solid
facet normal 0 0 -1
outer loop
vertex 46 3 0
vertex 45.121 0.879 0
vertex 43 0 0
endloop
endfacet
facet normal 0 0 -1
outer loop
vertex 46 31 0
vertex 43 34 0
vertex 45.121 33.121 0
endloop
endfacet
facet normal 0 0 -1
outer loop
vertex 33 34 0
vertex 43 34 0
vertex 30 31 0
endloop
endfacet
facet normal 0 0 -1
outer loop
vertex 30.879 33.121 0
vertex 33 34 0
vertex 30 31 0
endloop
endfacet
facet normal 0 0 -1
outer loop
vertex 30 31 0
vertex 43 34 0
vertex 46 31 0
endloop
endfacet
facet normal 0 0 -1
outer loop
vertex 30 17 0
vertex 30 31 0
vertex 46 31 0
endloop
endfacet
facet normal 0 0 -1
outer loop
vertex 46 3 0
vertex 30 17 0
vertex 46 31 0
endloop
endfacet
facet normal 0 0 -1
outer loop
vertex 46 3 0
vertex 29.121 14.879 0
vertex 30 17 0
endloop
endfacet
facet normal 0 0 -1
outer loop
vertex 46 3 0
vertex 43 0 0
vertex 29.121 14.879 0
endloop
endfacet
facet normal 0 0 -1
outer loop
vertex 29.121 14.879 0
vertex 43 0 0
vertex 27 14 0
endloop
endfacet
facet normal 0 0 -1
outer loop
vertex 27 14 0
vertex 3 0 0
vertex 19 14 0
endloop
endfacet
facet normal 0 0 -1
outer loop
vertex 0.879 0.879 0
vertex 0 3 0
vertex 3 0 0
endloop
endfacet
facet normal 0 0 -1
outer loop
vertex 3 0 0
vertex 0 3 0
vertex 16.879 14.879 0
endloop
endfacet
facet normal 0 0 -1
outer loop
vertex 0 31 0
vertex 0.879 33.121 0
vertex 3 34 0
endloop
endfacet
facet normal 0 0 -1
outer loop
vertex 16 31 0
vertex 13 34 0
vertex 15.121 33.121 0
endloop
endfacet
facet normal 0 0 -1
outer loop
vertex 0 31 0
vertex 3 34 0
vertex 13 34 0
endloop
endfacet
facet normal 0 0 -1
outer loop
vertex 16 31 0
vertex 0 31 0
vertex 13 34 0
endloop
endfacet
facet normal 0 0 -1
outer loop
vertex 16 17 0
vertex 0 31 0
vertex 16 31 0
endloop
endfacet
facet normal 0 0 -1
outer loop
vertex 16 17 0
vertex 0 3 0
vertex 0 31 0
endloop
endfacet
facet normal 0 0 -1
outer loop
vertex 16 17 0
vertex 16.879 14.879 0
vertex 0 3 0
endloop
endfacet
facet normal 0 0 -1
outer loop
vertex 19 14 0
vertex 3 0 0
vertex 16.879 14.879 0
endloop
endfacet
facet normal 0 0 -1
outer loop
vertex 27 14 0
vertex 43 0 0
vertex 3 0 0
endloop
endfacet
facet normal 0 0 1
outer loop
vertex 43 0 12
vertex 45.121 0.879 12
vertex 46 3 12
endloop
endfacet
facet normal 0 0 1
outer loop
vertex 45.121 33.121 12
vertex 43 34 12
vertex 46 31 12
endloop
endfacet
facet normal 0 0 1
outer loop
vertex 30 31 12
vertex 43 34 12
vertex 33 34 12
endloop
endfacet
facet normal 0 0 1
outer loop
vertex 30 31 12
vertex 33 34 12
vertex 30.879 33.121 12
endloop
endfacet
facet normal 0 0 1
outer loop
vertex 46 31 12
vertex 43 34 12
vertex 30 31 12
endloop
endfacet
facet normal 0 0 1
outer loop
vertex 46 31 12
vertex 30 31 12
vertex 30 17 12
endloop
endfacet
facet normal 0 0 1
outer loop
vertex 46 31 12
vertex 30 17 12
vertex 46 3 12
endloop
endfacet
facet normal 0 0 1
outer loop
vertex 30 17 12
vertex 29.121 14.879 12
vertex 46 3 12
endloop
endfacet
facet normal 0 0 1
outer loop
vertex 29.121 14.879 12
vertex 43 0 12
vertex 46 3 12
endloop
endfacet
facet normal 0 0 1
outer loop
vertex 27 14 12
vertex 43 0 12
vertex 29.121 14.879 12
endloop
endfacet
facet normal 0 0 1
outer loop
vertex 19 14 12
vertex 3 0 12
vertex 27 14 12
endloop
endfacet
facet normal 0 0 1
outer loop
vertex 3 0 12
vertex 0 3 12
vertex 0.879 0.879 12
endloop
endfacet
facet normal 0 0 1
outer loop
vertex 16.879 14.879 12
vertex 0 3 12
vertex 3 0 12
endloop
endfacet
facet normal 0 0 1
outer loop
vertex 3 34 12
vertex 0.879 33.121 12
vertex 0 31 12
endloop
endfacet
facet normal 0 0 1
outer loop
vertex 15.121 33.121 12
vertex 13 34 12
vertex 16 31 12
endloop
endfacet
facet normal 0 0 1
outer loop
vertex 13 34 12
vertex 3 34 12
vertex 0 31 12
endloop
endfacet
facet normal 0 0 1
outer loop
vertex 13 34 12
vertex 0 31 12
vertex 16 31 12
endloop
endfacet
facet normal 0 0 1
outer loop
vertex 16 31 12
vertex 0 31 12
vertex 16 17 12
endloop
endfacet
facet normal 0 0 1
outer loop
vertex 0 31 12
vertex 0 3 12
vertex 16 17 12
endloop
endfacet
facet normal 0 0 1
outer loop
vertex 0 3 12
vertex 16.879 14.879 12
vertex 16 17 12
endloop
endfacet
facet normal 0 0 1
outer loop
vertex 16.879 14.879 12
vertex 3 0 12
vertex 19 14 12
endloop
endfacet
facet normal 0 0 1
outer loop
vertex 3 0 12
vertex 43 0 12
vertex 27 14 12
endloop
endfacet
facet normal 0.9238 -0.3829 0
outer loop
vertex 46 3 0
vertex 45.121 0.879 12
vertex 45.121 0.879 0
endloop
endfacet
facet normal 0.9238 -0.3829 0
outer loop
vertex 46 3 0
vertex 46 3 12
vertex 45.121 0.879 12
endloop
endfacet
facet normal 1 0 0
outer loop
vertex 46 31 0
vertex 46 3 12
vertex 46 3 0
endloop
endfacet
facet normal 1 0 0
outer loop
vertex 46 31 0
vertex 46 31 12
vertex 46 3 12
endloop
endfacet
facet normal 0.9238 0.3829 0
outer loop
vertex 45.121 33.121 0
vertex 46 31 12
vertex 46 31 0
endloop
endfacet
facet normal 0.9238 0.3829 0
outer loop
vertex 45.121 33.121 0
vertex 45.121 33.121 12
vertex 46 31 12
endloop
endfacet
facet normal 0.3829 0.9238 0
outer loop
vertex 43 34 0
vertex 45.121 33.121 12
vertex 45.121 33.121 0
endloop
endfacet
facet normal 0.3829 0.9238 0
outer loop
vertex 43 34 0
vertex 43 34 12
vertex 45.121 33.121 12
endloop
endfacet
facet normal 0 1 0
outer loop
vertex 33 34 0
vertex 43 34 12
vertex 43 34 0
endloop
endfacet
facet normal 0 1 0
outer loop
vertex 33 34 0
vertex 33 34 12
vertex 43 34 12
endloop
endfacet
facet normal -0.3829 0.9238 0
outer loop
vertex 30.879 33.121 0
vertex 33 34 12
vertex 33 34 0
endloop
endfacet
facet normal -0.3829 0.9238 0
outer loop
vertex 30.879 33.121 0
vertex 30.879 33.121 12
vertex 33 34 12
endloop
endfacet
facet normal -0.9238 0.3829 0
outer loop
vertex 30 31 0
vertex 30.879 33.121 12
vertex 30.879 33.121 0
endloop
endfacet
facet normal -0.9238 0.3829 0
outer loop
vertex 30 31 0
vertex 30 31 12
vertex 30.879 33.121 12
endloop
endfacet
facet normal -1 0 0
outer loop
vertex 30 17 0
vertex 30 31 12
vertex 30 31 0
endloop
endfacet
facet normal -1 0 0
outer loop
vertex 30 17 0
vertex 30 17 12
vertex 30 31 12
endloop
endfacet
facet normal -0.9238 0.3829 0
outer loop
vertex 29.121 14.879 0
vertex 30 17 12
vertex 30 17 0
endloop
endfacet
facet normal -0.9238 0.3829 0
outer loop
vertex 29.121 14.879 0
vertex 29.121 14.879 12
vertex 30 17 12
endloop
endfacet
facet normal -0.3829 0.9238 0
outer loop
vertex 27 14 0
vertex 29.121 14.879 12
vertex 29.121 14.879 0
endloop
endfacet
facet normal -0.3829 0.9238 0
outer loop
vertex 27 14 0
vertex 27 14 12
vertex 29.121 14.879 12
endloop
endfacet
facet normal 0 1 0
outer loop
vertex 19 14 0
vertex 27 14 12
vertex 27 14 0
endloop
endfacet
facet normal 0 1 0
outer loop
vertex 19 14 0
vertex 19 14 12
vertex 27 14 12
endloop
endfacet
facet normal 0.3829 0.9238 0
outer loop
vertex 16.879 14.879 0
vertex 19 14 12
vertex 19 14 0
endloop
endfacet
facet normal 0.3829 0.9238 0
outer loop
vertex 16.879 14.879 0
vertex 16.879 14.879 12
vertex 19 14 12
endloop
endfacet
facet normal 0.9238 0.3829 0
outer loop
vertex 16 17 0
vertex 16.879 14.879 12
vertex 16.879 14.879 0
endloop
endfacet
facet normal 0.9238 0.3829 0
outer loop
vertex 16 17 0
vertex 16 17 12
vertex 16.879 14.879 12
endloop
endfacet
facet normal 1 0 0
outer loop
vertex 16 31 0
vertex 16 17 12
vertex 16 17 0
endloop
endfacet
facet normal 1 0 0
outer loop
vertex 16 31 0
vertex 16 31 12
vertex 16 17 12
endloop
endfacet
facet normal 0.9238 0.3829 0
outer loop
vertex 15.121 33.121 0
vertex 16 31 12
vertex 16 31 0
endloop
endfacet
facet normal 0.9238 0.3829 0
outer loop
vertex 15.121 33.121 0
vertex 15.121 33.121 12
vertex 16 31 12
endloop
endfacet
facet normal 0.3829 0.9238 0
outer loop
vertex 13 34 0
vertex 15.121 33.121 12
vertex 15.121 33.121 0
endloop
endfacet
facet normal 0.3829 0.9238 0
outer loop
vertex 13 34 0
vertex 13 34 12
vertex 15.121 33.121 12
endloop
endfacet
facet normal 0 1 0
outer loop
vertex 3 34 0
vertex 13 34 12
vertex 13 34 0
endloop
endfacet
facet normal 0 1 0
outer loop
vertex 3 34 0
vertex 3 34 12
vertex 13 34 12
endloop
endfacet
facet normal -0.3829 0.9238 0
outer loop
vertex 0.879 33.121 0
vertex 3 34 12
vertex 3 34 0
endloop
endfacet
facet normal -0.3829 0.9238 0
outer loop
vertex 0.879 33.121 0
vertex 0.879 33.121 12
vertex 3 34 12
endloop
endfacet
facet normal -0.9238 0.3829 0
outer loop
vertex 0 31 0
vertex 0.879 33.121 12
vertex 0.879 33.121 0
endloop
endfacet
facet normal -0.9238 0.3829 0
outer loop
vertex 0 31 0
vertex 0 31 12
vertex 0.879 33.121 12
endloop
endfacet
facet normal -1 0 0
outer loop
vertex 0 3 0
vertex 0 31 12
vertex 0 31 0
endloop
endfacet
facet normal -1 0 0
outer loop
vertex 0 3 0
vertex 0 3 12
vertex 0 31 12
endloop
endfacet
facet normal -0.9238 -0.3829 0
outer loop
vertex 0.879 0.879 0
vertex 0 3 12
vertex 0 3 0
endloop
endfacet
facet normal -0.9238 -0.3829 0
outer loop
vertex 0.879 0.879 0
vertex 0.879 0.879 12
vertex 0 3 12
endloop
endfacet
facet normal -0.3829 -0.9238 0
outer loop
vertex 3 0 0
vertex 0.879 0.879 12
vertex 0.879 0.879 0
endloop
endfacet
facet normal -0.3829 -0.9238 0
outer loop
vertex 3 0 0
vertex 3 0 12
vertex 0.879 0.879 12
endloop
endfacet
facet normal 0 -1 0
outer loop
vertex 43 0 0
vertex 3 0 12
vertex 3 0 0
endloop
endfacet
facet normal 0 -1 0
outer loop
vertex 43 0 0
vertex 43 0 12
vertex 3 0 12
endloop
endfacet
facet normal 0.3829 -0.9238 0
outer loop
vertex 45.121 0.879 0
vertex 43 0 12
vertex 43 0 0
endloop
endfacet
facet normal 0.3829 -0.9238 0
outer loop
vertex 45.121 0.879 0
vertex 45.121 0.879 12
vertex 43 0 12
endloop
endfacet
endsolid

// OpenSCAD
$fn = 32;

// ----------------------------------------------------------------------
// Eye lug: clevis, 12 mm thick
// ----------------------------------------------------------------------

// --- parameters (mm) ---
profile_height = 12;      // extrusion height
profile_points = 24;      // points of the closed outline

profile = [[0, 3], [0.879, 0.879], [3, 0], [43, 0], [45.121, 0.879], [46, 3], [46, 31], [45.121, 33.121], [43, 34], [33, 34], [30.879, 33.121], [30, 31], [30, 17], [29.121, 14.879], [27, 14], [19, 14], [16.879, 14.879], [16, 17], [16, 31], [15.121, 33.121], [13, 34], [3, 34], [0.879, 33.121], [0, 31]];  // single closed polygon, 24 points, counter clockwise

// --- the one profile operation ---
linear_extrude(height = profile_height) polygon(points = profile);
